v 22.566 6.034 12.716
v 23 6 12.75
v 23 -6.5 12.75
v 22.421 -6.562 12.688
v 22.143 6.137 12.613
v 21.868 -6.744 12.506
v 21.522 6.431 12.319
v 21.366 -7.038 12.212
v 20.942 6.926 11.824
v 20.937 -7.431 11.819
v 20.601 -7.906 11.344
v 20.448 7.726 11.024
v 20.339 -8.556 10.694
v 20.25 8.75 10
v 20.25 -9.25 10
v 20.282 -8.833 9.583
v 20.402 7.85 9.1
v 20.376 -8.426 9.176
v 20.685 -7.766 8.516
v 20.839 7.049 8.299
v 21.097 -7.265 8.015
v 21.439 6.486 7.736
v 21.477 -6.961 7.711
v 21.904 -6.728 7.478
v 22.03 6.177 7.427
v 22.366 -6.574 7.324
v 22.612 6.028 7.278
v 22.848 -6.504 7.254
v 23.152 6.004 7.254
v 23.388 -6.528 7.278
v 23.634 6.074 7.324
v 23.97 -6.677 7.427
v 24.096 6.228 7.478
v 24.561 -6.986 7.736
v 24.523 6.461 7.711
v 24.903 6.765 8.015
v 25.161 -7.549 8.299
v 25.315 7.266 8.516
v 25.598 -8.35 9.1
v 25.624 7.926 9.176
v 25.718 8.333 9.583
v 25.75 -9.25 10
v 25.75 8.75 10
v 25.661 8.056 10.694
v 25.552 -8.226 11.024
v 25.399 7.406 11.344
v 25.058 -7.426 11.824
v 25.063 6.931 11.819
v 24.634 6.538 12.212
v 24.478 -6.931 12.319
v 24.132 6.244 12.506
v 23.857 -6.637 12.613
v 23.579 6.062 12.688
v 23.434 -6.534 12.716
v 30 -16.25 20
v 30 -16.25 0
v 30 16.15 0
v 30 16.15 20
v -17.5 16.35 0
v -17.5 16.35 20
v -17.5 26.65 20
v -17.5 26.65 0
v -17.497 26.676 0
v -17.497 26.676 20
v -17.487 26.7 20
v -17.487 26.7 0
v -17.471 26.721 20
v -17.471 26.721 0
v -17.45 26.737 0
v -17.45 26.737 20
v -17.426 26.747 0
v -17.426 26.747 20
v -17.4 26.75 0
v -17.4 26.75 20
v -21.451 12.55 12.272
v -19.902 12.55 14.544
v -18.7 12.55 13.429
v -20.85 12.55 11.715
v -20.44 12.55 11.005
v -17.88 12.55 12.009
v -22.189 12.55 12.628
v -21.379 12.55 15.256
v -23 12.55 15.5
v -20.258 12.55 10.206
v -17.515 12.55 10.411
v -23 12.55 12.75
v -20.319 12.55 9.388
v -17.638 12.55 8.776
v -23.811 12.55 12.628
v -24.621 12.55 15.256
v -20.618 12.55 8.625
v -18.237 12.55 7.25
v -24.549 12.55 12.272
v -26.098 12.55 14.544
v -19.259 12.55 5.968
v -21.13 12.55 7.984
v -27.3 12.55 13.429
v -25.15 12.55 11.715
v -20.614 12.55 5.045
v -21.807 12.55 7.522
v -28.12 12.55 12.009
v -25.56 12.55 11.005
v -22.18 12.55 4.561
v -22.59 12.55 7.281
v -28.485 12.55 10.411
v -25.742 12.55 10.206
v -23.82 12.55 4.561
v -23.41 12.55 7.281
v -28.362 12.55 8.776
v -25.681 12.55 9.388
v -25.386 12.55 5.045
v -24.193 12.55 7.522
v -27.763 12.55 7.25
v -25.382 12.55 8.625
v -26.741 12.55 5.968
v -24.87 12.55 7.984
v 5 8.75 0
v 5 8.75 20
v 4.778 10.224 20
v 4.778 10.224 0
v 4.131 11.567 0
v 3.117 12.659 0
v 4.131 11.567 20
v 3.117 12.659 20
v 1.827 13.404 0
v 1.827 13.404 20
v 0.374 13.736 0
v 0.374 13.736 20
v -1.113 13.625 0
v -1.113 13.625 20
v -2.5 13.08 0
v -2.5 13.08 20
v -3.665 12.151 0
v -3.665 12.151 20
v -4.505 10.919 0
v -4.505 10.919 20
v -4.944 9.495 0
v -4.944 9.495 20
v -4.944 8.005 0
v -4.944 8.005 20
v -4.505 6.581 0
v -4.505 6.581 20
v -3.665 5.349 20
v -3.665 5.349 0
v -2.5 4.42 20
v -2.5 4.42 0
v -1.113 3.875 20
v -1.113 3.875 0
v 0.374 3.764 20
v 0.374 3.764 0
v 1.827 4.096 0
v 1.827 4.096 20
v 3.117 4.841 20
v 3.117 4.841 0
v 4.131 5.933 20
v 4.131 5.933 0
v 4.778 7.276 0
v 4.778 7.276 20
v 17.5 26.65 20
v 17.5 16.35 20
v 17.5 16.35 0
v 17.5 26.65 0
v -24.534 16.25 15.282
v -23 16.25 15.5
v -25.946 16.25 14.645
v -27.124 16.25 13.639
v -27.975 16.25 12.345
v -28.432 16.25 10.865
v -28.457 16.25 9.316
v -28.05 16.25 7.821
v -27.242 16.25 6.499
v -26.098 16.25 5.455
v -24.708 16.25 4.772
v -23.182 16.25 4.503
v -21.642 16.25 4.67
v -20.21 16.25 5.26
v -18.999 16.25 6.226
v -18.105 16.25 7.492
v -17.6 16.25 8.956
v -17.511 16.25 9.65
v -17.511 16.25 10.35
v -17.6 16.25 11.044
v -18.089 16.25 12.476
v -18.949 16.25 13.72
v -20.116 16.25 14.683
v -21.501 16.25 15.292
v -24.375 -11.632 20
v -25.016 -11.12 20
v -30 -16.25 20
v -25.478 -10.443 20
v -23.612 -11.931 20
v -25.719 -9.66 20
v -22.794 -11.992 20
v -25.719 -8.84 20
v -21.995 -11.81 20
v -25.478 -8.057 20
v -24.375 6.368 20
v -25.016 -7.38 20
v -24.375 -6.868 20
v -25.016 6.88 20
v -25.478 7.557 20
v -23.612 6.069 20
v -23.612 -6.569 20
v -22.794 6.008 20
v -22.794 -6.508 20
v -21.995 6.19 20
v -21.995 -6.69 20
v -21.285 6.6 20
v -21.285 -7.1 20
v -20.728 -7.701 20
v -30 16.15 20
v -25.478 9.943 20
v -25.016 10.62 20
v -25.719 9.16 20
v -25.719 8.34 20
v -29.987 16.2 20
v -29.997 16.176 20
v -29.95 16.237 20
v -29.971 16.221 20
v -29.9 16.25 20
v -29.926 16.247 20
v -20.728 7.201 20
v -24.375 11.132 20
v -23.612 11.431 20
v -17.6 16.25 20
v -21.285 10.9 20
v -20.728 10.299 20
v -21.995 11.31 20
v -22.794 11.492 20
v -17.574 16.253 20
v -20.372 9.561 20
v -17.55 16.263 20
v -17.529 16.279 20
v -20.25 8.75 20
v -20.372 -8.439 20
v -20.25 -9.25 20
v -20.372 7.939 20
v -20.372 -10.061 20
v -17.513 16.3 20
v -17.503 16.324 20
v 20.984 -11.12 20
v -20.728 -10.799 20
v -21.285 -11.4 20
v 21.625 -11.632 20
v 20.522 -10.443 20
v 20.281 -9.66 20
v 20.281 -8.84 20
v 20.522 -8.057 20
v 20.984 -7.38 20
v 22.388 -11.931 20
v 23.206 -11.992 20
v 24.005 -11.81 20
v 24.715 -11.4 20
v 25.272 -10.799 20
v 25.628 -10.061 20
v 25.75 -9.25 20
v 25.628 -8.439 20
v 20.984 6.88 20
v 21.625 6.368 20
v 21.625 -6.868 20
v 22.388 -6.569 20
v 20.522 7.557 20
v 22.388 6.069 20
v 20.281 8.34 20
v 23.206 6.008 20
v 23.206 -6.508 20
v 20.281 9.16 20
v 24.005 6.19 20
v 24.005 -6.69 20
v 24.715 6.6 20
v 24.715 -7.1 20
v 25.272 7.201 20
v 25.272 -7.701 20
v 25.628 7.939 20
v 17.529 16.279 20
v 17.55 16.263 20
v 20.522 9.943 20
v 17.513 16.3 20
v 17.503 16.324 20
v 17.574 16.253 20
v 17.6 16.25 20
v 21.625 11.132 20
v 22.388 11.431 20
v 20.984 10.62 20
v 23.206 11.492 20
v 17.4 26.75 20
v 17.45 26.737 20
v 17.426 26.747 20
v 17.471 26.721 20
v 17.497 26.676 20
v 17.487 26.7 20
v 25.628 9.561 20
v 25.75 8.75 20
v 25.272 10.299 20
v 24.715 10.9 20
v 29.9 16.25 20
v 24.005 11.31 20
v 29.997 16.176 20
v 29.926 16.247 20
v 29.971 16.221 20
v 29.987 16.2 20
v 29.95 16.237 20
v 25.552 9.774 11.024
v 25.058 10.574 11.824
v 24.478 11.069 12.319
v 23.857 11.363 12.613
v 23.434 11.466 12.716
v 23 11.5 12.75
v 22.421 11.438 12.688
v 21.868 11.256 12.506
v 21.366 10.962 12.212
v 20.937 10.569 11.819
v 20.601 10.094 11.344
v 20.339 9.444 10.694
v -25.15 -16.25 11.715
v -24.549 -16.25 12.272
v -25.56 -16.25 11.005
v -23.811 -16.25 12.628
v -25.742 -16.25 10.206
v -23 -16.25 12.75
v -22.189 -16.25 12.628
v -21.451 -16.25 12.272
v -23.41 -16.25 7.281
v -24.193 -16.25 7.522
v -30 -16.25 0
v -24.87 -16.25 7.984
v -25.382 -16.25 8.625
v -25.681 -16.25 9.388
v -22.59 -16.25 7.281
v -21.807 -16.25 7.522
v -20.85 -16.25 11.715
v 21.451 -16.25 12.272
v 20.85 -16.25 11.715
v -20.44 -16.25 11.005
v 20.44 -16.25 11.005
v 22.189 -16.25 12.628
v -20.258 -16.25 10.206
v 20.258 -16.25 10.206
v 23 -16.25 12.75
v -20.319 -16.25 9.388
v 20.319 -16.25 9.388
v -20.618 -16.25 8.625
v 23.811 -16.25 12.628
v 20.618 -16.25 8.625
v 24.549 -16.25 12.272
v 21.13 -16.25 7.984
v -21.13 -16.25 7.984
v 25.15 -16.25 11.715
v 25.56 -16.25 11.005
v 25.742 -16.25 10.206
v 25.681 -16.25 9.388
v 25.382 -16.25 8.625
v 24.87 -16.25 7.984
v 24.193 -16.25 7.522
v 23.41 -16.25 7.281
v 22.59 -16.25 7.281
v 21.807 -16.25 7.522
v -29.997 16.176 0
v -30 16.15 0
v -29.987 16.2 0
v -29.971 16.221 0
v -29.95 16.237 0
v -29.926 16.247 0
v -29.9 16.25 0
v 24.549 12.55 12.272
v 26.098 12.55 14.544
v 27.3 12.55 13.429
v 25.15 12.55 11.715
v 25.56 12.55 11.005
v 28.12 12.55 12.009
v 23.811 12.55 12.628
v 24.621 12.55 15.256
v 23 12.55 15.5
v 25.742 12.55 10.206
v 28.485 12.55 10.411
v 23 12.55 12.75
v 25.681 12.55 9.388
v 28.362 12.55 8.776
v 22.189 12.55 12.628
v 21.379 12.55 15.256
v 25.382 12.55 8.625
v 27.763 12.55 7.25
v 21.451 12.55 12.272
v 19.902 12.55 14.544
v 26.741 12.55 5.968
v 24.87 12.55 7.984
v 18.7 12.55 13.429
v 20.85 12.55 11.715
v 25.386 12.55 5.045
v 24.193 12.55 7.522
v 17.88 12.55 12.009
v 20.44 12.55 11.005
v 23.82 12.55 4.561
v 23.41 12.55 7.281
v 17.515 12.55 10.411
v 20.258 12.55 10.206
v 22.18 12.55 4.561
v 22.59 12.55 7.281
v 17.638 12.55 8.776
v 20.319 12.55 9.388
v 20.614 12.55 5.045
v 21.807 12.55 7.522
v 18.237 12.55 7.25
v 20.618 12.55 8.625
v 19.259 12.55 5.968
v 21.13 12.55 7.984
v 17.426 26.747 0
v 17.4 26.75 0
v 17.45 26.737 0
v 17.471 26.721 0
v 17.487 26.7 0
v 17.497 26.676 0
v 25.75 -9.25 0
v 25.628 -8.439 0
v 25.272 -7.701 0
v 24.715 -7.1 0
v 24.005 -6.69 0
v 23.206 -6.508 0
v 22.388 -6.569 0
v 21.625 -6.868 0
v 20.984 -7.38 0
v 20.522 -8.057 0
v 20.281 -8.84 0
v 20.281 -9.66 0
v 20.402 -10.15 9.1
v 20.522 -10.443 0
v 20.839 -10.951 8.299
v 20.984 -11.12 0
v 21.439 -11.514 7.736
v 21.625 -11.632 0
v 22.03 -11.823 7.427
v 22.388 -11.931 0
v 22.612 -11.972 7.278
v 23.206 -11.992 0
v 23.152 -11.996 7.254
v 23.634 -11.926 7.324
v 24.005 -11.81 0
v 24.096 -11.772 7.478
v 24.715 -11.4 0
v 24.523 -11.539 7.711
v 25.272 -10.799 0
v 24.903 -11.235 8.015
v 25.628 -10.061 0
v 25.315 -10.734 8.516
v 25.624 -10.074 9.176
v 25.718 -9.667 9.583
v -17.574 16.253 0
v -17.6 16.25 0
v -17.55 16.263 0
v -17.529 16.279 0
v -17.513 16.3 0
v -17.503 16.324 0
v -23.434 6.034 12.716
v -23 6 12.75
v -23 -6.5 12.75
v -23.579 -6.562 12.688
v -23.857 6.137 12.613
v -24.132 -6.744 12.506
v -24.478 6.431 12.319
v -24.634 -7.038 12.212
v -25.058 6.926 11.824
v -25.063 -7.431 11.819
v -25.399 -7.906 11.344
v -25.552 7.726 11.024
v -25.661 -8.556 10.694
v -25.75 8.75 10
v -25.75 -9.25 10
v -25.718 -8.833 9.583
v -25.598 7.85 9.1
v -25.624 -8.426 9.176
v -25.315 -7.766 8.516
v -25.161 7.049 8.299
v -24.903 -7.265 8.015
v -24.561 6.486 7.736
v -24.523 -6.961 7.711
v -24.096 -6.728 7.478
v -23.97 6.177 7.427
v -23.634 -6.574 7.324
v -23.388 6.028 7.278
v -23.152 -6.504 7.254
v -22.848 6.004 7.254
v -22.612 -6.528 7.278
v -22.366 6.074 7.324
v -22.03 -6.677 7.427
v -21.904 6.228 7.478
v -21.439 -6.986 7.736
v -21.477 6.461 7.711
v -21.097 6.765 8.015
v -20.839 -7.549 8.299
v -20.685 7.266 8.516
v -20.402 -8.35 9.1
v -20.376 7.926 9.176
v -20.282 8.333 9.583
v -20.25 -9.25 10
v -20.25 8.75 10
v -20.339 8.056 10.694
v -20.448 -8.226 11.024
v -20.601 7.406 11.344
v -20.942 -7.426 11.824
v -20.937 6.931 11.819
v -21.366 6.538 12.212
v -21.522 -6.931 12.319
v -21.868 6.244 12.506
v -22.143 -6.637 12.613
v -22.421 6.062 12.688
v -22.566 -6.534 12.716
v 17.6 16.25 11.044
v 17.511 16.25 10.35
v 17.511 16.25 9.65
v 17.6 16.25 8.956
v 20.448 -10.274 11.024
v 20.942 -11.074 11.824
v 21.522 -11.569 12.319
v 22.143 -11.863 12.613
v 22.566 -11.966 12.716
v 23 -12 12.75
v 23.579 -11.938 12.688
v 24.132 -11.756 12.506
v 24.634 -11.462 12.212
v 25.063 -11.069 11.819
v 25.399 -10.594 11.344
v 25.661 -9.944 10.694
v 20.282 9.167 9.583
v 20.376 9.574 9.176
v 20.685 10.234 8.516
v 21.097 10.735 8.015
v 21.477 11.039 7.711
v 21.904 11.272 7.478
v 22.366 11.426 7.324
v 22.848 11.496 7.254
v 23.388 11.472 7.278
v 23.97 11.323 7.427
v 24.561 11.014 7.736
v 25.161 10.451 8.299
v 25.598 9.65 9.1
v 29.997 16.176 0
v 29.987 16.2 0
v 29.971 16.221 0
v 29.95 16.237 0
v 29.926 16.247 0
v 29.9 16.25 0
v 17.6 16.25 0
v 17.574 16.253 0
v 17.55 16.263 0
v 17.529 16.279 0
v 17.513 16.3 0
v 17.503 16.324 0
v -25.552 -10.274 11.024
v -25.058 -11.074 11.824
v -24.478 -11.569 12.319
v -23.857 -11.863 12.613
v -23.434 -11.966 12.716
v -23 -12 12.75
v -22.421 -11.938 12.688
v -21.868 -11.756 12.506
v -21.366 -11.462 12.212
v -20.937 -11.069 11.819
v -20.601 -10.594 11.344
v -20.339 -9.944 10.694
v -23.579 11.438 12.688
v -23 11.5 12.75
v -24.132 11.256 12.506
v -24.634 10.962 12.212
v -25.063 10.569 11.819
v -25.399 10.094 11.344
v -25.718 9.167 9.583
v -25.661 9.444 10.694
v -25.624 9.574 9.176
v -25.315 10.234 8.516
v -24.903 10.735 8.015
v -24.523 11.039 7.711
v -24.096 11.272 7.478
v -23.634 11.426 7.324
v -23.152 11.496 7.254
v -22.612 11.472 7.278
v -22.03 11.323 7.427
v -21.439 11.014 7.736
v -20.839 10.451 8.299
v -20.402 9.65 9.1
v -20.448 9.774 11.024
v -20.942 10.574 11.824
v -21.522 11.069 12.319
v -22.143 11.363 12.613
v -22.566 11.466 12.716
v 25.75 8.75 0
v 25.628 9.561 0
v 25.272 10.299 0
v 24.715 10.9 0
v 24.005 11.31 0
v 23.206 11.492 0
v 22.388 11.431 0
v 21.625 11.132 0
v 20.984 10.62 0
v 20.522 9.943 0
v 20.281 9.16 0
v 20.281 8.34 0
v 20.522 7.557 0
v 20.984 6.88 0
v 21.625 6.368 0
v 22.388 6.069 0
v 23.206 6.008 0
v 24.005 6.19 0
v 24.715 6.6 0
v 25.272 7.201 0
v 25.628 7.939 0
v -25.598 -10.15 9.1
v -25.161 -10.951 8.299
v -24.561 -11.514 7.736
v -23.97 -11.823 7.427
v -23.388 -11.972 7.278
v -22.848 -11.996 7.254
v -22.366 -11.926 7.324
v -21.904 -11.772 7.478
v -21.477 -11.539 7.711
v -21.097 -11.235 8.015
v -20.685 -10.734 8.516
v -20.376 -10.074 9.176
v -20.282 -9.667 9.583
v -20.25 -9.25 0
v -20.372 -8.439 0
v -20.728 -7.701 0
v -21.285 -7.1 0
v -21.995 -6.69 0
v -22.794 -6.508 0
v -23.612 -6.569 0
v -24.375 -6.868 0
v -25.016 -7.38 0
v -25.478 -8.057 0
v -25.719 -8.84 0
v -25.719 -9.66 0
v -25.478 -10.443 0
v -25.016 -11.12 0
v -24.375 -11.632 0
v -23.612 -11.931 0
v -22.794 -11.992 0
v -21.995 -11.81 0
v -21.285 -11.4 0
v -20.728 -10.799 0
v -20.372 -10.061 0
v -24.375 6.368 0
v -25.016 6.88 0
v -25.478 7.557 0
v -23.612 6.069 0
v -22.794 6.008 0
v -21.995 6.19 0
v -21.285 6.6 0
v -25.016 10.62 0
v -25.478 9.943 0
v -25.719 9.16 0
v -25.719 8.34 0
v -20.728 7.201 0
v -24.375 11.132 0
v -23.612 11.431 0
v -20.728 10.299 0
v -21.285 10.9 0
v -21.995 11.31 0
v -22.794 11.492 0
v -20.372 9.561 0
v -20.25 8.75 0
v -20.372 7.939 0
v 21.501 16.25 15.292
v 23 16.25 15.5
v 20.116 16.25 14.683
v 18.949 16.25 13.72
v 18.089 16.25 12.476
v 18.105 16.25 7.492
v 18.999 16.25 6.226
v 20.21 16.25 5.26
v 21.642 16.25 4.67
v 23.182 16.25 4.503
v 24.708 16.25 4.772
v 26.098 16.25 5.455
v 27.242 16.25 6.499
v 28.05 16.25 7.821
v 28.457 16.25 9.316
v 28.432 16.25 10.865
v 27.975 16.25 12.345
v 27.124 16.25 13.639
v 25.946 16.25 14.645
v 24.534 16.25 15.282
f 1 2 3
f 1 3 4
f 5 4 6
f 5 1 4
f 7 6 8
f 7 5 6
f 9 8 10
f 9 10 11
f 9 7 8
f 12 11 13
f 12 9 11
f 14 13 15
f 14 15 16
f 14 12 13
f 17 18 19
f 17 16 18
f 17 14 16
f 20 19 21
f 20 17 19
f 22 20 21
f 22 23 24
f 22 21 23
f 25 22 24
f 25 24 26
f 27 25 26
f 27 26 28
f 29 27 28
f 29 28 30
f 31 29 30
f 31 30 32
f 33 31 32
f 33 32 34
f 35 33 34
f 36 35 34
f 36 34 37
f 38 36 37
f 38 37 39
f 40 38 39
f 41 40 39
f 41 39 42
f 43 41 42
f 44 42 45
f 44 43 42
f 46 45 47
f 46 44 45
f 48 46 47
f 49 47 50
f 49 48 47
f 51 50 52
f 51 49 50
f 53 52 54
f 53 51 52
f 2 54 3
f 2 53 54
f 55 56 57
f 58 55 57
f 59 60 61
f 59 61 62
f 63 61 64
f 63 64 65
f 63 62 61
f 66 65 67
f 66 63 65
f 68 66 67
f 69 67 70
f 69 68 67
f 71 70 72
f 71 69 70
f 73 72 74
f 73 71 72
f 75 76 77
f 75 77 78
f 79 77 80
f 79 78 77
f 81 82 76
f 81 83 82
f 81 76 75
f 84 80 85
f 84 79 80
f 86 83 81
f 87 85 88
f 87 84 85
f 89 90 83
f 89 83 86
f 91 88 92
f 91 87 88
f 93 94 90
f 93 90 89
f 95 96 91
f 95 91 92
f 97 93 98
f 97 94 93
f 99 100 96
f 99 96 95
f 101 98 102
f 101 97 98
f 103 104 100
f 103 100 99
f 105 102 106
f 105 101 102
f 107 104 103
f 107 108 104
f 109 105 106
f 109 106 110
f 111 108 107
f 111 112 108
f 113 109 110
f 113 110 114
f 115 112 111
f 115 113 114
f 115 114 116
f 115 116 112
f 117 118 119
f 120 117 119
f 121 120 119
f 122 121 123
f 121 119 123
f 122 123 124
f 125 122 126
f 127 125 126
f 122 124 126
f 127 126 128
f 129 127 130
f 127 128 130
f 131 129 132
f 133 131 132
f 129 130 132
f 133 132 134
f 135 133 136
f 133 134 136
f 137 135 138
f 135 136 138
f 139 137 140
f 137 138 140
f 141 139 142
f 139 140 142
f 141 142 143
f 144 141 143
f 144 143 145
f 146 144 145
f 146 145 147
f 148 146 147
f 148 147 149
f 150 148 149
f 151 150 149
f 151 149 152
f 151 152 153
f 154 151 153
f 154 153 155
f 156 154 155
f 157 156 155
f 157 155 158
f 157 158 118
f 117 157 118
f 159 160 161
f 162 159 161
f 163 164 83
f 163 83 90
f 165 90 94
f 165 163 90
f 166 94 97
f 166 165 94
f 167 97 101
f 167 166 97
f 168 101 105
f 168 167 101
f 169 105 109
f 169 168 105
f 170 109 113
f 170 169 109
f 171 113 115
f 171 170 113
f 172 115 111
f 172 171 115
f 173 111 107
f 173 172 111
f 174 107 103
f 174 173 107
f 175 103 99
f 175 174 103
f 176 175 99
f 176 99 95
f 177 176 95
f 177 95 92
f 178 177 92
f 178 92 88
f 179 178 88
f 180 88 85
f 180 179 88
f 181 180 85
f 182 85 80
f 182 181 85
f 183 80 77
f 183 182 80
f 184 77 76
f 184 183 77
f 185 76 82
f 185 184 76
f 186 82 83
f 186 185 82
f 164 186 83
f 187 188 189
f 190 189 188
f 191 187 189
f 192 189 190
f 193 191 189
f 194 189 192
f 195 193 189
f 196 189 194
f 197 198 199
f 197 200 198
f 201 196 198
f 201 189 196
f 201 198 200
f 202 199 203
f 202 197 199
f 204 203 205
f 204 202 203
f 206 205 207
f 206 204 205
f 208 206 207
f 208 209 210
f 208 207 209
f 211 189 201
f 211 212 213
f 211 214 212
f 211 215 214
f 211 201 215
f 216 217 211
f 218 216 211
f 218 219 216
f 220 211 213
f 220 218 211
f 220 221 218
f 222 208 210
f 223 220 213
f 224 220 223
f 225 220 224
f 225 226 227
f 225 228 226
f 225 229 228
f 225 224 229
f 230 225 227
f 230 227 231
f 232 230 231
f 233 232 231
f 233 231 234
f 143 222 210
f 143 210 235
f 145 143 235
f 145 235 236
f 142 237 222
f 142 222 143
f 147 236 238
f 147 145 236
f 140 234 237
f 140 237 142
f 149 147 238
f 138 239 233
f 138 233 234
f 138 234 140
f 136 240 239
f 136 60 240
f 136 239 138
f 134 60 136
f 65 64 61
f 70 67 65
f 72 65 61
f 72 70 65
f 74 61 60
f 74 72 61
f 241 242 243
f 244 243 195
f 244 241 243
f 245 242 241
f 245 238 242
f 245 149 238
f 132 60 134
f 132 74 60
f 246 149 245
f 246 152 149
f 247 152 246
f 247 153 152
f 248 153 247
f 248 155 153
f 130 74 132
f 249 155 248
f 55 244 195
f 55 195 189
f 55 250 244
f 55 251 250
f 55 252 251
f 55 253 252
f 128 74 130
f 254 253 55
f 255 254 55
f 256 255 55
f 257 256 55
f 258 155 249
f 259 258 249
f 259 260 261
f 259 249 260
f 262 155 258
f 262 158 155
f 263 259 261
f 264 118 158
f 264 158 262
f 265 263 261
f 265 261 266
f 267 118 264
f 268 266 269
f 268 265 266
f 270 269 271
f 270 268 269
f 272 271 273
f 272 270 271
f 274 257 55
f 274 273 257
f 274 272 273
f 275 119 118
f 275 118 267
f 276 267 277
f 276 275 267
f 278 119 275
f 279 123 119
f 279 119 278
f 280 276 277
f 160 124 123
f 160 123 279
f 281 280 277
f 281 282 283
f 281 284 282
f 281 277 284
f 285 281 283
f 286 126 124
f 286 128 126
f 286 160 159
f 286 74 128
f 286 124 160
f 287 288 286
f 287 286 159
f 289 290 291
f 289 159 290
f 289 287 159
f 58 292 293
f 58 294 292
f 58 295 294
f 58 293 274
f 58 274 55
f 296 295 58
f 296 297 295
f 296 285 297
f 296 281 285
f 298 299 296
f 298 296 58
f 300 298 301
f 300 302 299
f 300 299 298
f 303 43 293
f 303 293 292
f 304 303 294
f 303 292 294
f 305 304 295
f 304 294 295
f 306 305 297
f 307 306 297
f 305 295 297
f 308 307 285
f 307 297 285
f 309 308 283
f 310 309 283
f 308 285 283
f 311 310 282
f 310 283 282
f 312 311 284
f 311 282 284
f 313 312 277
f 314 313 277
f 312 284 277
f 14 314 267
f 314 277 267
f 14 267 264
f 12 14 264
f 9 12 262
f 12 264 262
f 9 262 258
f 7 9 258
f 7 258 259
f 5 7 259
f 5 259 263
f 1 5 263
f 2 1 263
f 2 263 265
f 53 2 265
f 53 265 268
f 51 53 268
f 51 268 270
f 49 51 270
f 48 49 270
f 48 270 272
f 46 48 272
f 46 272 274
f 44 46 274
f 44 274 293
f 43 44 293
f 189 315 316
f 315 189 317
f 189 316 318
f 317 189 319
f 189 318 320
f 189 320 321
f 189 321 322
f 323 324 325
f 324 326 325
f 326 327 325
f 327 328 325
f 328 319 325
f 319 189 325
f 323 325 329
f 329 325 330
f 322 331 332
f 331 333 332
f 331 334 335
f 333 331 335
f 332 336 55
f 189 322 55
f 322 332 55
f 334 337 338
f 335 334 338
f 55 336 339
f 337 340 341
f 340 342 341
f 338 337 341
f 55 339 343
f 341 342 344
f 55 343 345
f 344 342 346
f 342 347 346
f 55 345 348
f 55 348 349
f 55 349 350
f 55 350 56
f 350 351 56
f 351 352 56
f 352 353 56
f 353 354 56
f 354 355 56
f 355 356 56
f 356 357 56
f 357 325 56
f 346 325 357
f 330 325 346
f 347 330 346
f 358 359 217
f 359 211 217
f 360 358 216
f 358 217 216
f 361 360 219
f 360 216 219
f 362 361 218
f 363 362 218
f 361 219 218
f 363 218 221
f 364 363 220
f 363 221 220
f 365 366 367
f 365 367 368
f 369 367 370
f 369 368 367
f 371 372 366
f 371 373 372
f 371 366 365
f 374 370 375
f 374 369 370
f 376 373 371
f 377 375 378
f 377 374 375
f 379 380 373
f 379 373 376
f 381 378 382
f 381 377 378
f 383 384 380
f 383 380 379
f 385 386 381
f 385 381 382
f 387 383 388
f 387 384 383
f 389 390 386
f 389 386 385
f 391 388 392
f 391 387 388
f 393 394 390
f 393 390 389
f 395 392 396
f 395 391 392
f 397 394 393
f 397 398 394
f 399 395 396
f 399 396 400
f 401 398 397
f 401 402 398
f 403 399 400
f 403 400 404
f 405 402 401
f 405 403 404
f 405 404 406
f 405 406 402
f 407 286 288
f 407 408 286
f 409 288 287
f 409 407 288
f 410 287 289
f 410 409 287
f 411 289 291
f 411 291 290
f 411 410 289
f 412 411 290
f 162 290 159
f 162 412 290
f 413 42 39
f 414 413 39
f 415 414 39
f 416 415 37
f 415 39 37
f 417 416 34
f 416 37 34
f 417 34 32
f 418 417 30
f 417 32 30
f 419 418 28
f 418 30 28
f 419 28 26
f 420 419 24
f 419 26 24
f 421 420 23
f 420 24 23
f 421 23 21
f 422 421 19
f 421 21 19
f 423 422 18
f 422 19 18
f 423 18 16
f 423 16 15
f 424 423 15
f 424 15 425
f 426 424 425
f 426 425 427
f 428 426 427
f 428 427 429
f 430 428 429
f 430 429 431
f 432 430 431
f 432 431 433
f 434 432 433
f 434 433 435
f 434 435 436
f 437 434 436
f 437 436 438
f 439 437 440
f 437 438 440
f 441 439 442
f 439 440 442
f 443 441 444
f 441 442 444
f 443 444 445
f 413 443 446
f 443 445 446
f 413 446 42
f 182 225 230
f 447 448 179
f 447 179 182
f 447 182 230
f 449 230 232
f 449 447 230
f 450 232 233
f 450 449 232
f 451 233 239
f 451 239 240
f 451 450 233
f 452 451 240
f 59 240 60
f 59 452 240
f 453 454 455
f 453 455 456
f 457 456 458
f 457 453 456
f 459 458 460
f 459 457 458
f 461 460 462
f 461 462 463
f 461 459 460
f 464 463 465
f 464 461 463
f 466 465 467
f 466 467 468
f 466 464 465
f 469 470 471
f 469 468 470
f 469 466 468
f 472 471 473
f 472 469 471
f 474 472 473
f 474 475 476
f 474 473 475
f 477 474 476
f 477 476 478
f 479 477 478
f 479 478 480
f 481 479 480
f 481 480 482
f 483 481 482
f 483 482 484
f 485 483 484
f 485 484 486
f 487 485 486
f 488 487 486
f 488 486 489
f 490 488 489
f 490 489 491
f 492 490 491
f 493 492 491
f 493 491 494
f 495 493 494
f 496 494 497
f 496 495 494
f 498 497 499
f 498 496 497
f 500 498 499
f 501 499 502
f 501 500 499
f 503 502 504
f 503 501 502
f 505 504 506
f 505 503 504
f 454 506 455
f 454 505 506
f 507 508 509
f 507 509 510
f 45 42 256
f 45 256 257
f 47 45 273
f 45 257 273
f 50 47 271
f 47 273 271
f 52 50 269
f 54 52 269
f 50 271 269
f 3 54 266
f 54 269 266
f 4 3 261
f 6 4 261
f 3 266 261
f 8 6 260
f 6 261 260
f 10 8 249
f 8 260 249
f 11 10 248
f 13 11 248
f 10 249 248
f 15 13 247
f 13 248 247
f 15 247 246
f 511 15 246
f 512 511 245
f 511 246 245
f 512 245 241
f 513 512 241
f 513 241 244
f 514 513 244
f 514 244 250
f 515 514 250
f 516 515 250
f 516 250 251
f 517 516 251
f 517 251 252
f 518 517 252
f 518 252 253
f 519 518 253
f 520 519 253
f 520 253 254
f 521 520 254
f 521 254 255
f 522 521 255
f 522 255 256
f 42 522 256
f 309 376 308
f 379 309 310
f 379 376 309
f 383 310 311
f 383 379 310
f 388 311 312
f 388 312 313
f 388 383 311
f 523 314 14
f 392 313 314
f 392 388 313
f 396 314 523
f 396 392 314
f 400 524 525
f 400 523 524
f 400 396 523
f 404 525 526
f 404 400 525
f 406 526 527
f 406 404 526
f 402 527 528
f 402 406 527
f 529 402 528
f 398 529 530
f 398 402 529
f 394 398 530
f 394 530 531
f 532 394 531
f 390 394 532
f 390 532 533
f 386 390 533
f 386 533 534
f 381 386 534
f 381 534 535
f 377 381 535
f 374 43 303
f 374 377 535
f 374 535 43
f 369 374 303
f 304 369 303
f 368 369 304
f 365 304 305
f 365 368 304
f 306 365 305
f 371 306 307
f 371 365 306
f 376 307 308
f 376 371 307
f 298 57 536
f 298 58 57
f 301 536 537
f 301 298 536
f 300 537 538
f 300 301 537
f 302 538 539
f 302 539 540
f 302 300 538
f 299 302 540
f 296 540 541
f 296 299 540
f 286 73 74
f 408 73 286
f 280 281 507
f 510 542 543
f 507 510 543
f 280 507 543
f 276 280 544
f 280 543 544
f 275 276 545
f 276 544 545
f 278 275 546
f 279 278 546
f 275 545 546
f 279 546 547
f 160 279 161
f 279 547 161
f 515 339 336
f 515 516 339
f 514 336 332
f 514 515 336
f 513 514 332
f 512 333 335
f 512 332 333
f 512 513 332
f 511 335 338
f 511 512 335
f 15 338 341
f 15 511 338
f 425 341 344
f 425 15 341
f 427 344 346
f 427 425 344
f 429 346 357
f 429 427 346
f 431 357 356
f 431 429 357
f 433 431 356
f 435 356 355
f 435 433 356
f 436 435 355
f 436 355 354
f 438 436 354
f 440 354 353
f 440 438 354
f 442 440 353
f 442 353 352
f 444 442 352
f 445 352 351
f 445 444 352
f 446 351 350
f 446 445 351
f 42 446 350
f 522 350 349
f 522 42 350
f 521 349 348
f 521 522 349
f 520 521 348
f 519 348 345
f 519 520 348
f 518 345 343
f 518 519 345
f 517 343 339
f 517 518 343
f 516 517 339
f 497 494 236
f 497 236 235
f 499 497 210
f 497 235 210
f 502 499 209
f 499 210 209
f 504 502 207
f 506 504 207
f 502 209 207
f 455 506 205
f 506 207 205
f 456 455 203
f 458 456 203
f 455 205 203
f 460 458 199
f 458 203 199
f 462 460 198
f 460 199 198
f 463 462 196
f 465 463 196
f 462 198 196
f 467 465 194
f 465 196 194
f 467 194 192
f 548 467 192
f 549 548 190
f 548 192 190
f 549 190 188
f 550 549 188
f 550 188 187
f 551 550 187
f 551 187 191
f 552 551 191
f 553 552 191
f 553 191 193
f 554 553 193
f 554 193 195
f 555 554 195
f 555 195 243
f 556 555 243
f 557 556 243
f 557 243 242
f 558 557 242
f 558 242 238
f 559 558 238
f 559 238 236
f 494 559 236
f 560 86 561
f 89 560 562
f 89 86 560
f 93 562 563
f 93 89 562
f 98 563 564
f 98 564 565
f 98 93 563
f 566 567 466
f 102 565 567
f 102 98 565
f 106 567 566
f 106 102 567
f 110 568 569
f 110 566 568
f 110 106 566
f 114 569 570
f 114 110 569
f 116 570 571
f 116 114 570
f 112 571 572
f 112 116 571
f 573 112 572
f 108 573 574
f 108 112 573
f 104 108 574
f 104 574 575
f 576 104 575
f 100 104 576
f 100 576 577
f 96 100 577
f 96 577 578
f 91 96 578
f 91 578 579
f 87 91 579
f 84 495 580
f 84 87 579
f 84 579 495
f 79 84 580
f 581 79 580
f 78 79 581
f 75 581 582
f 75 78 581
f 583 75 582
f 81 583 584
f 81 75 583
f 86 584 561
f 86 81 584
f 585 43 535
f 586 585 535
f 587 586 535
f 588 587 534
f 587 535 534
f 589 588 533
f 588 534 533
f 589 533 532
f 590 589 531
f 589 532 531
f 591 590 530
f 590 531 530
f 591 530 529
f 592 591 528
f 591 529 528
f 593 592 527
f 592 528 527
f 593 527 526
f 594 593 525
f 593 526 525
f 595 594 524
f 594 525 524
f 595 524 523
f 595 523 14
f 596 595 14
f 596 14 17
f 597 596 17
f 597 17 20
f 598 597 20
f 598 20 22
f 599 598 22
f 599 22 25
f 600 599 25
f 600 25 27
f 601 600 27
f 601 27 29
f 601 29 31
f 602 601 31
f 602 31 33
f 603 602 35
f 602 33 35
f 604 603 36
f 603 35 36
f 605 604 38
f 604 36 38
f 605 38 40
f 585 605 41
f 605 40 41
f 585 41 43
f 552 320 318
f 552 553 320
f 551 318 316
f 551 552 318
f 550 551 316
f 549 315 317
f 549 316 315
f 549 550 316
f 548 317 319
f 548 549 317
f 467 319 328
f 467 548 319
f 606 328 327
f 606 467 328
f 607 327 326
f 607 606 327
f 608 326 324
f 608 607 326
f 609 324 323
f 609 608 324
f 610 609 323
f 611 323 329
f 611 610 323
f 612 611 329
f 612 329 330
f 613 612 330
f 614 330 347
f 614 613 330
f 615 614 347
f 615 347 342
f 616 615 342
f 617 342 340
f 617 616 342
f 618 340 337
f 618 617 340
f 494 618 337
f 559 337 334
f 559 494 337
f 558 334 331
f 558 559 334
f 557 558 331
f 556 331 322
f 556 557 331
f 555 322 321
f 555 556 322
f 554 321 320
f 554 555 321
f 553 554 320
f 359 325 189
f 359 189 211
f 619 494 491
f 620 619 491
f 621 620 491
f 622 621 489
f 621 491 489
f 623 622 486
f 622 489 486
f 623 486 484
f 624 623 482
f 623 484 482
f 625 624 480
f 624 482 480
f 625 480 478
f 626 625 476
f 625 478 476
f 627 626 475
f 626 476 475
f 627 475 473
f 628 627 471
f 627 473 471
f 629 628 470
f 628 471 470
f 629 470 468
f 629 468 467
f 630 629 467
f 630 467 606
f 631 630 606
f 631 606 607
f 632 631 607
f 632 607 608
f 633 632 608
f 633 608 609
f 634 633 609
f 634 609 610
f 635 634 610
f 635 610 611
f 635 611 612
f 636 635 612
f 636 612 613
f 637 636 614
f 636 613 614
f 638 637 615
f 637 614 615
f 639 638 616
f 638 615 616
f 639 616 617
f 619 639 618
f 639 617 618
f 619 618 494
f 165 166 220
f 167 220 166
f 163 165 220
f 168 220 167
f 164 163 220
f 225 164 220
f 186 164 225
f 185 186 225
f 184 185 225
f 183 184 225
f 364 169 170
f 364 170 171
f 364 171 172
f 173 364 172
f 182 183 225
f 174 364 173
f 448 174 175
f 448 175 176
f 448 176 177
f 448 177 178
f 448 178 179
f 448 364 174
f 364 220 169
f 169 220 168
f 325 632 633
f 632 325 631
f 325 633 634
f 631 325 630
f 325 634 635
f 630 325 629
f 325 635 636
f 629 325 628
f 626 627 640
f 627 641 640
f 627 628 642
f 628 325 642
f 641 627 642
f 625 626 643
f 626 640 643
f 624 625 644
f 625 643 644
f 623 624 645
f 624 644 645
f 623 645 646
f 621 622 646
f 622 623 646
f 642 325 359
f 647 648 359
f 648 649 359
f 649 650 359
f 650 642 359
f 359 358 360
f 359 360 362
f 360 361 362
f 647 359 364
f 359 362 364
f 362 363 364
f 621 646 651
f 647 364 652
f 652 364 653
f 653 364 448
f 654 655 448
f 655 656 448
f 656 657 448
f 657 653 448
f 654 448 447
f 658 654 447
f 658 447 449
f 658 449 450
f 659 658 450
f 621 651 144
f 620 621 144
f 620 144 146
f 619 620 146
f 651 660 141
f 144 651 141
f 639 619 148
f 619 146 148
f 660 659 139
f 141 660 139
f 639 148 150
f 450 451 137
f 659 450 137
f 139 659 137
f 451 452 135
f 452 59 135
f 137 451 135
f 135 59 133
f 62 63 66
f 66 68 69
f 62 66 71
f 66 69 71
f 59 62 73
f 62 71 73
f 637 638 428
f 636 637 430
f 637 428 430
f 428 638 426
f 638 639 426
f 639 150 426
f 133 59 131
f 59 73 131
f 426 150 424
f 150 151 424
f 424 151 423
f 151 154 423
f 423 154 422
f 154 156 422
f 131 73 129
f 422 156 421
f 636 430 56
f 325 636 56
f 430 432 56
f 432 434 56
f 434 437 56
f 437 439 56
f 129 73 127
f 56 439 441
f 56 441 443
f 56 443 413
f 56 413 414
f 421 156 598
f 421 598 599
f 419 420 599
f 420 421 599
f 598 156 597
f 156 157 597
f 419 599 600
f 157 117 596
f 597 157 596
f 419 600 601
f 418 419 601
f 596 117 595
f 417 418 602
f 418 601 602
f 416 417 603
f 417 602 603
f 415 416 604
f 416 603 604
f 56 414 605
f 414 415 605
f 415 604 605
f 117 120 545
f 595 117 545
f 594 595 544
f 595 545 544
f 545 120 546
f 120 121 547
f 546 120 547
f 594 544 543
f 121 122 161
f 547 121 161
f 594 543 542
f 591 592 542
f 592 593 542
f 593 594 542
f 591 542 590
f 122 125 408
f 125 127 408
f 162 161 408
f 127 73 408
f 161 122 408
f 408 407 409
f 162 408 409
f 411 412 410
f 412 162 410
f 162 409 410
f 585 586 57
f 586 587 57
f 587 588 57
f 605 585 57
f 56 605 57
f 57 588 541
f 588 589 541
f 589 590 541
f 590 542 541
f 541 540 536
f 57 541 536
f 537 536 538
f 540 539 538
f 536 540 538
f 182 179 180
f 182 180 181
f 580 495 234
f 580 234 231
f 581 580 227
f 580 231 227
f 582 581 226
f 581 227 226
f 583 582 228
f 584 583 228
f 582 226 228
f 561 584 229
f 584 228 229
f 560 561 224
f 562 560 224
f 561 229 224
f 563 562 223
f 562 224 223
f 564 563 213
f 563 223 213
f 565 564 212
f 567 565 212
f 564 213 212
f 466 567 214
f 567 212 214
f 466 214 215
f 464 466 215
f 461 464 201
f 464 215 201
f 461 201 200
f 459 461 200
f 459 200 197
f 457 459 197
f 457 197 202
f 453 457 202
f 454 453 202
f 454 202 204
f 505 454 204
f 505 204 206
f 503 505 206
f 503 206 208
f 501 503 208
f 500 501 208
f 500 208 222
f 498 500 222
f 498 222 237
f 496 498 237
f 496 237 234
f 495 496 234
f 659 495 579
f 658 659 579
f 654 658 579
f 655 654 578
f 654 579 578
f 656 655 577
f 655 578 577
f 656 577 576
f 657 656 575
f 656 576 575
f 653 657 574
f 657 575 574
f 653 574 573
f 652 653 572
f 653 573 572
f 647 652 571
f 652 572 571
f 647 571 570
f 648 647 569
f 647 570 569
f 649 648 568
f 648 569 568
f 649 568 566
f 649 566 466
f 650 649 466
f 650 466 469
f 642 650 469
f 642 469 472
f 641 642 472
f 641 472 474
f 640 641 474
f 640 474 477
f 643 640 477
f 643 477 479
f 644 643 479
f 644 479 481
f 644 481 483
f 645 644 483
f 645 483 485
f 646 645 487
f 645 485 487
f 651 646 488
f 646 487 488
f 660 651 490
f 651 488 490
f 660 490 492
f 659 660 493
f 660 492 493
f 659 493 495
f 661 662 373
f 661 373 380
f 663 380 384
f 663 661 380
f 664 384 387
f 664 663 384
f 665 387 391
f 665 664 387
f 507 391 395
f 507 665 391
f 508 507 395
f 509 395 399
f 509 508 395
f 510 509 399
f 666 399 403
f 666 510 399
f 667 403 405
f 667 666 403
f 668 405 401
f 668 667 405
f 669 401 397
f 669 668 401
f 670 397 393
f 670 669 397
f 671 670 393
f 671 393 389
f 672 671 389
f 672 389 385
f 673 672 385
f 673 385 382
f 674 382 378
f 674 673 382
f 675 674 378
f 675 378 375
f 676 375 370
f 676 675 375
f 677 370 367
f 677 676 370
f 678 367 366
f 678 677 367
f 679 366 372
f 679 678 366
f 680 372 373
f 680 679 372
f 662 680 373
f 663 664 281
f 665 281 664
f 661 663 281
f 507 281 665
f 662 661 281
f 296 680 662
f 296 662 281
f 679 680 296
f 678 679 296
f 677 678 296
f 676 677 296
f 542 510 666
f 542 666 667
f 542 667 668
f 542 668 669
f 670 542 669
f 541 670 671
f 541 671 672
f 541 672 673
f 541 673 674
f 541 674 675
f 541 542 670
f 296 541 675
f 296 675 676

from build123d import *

# Parameters (mm, degrees)
SKETCH_1_W                  = 60
SKETCH_1_H                  = 32.5
EXTRUDE_1_DEPTH             = 20
SKETCH_2_W                  = 35
SKETCH_2_H                  = 20
EXTRUDE_2_DEPTH             = 10.5
FILLET_1_R                  = 0.1
SKETCH_3_R                  = 5
SKETCH_3_R_2                = 2.75
CUT_EXTRUDE_1_DEPTH         = 45.895016427
HOLE_WIZARD_M5_1_AT_2_COUNT = 2
HOLE_WIZARD_M5_1_AT_2_PITCH = 46


with BuildPart() as part:
    # 스케치1 → 보스-돌출1 (new body)
    with BuildSketch(Plane.XY):
        Rectangle(SKETCH_1_W, SKETCH_1_H)
    extrude(amount=EXTRUDE_1_DEPTH)

    # 스케치2 → 보스-돌출2 (add)
    with BuildSketch(Plane(origin=(0, 16.25, 0), x_dir=(1, 0, 0), z_dir=(0, 1, 0))):
        with Locations((0, -10)):
            Rectangle(SKETCH_2_W, SKETCH_2_H)
    extrude(amount=EXTRUDE_2_DEPTH)

    # 필렛1
    fillet_1_edges = [part.edges().sort_by_distance(p)[0] for p in [
        (17.5, 16.25, 10),
        (-17.5, 16.25, 10),
        (17.5, 26.75, 10),
        (-17.5, 26.75, 10),
        (-30, 16.25, 10),
        (30, 16.25, 10),
    ]]
    fillet(fillet_1_edges, radius=FILLET_1_R)

    # 스케치3 → 컷-돌출1 (cut, through all)
    with BuildSketch(Plane.XY.offset(20)):
        with Locations((0, 8.75)):
            Circle(SKETCH_3_R)
        with Locations((-23, 8.75)):
            Circle(SKETCH_3_R_2)
        with Locations((-23, -9.25)):
            Circle(SKETCH_3_R_2)
        with Locations((23, 8.75)):
            Circle(SKETCH_3_R_2)
        with Locations((23, -9.25)):
            Circle(SKETCH_3_R_2)
    extrude(amount=-CUT_EXTRUDE_1_DEPTH, mode=Mode.SUBTRACT)

    # 스케치7 → M5 남비 머리 나사용 카운터보어1 (revolve, cut)
    with BuildSketch(Plane(origin=(23, 16.25, 10), x_dir=(0, 0, 1), z_dir=(1, 0, 0))):
        Polygon((0, 0), (0, 41.652366702), (2.75, 40), (2.75, 3.7), (5.5, 3.7), (5.5, 0), align=None)
    hole_wizard_m5_1 = revolve(axis=Axis((23, 22.6, 10), (0, -1, 0)), mode=Mode.SUBTRACT)

    # M5 남비 머리 나사용 카운터보어1 at 2: M5 남비 머리 나사용 카운터보어1 ×2
    with Locations(*[(-i * HOLE_WIZARD_M5_1_AT_2_PITCH, 0, 0) for i in range(1, HOLE_WIZARD_M5_1_AT_2_COUNT)]):
        add(hole_wizard_m5_1, mode=Mode.SUBTRACT)


solid = part.part
